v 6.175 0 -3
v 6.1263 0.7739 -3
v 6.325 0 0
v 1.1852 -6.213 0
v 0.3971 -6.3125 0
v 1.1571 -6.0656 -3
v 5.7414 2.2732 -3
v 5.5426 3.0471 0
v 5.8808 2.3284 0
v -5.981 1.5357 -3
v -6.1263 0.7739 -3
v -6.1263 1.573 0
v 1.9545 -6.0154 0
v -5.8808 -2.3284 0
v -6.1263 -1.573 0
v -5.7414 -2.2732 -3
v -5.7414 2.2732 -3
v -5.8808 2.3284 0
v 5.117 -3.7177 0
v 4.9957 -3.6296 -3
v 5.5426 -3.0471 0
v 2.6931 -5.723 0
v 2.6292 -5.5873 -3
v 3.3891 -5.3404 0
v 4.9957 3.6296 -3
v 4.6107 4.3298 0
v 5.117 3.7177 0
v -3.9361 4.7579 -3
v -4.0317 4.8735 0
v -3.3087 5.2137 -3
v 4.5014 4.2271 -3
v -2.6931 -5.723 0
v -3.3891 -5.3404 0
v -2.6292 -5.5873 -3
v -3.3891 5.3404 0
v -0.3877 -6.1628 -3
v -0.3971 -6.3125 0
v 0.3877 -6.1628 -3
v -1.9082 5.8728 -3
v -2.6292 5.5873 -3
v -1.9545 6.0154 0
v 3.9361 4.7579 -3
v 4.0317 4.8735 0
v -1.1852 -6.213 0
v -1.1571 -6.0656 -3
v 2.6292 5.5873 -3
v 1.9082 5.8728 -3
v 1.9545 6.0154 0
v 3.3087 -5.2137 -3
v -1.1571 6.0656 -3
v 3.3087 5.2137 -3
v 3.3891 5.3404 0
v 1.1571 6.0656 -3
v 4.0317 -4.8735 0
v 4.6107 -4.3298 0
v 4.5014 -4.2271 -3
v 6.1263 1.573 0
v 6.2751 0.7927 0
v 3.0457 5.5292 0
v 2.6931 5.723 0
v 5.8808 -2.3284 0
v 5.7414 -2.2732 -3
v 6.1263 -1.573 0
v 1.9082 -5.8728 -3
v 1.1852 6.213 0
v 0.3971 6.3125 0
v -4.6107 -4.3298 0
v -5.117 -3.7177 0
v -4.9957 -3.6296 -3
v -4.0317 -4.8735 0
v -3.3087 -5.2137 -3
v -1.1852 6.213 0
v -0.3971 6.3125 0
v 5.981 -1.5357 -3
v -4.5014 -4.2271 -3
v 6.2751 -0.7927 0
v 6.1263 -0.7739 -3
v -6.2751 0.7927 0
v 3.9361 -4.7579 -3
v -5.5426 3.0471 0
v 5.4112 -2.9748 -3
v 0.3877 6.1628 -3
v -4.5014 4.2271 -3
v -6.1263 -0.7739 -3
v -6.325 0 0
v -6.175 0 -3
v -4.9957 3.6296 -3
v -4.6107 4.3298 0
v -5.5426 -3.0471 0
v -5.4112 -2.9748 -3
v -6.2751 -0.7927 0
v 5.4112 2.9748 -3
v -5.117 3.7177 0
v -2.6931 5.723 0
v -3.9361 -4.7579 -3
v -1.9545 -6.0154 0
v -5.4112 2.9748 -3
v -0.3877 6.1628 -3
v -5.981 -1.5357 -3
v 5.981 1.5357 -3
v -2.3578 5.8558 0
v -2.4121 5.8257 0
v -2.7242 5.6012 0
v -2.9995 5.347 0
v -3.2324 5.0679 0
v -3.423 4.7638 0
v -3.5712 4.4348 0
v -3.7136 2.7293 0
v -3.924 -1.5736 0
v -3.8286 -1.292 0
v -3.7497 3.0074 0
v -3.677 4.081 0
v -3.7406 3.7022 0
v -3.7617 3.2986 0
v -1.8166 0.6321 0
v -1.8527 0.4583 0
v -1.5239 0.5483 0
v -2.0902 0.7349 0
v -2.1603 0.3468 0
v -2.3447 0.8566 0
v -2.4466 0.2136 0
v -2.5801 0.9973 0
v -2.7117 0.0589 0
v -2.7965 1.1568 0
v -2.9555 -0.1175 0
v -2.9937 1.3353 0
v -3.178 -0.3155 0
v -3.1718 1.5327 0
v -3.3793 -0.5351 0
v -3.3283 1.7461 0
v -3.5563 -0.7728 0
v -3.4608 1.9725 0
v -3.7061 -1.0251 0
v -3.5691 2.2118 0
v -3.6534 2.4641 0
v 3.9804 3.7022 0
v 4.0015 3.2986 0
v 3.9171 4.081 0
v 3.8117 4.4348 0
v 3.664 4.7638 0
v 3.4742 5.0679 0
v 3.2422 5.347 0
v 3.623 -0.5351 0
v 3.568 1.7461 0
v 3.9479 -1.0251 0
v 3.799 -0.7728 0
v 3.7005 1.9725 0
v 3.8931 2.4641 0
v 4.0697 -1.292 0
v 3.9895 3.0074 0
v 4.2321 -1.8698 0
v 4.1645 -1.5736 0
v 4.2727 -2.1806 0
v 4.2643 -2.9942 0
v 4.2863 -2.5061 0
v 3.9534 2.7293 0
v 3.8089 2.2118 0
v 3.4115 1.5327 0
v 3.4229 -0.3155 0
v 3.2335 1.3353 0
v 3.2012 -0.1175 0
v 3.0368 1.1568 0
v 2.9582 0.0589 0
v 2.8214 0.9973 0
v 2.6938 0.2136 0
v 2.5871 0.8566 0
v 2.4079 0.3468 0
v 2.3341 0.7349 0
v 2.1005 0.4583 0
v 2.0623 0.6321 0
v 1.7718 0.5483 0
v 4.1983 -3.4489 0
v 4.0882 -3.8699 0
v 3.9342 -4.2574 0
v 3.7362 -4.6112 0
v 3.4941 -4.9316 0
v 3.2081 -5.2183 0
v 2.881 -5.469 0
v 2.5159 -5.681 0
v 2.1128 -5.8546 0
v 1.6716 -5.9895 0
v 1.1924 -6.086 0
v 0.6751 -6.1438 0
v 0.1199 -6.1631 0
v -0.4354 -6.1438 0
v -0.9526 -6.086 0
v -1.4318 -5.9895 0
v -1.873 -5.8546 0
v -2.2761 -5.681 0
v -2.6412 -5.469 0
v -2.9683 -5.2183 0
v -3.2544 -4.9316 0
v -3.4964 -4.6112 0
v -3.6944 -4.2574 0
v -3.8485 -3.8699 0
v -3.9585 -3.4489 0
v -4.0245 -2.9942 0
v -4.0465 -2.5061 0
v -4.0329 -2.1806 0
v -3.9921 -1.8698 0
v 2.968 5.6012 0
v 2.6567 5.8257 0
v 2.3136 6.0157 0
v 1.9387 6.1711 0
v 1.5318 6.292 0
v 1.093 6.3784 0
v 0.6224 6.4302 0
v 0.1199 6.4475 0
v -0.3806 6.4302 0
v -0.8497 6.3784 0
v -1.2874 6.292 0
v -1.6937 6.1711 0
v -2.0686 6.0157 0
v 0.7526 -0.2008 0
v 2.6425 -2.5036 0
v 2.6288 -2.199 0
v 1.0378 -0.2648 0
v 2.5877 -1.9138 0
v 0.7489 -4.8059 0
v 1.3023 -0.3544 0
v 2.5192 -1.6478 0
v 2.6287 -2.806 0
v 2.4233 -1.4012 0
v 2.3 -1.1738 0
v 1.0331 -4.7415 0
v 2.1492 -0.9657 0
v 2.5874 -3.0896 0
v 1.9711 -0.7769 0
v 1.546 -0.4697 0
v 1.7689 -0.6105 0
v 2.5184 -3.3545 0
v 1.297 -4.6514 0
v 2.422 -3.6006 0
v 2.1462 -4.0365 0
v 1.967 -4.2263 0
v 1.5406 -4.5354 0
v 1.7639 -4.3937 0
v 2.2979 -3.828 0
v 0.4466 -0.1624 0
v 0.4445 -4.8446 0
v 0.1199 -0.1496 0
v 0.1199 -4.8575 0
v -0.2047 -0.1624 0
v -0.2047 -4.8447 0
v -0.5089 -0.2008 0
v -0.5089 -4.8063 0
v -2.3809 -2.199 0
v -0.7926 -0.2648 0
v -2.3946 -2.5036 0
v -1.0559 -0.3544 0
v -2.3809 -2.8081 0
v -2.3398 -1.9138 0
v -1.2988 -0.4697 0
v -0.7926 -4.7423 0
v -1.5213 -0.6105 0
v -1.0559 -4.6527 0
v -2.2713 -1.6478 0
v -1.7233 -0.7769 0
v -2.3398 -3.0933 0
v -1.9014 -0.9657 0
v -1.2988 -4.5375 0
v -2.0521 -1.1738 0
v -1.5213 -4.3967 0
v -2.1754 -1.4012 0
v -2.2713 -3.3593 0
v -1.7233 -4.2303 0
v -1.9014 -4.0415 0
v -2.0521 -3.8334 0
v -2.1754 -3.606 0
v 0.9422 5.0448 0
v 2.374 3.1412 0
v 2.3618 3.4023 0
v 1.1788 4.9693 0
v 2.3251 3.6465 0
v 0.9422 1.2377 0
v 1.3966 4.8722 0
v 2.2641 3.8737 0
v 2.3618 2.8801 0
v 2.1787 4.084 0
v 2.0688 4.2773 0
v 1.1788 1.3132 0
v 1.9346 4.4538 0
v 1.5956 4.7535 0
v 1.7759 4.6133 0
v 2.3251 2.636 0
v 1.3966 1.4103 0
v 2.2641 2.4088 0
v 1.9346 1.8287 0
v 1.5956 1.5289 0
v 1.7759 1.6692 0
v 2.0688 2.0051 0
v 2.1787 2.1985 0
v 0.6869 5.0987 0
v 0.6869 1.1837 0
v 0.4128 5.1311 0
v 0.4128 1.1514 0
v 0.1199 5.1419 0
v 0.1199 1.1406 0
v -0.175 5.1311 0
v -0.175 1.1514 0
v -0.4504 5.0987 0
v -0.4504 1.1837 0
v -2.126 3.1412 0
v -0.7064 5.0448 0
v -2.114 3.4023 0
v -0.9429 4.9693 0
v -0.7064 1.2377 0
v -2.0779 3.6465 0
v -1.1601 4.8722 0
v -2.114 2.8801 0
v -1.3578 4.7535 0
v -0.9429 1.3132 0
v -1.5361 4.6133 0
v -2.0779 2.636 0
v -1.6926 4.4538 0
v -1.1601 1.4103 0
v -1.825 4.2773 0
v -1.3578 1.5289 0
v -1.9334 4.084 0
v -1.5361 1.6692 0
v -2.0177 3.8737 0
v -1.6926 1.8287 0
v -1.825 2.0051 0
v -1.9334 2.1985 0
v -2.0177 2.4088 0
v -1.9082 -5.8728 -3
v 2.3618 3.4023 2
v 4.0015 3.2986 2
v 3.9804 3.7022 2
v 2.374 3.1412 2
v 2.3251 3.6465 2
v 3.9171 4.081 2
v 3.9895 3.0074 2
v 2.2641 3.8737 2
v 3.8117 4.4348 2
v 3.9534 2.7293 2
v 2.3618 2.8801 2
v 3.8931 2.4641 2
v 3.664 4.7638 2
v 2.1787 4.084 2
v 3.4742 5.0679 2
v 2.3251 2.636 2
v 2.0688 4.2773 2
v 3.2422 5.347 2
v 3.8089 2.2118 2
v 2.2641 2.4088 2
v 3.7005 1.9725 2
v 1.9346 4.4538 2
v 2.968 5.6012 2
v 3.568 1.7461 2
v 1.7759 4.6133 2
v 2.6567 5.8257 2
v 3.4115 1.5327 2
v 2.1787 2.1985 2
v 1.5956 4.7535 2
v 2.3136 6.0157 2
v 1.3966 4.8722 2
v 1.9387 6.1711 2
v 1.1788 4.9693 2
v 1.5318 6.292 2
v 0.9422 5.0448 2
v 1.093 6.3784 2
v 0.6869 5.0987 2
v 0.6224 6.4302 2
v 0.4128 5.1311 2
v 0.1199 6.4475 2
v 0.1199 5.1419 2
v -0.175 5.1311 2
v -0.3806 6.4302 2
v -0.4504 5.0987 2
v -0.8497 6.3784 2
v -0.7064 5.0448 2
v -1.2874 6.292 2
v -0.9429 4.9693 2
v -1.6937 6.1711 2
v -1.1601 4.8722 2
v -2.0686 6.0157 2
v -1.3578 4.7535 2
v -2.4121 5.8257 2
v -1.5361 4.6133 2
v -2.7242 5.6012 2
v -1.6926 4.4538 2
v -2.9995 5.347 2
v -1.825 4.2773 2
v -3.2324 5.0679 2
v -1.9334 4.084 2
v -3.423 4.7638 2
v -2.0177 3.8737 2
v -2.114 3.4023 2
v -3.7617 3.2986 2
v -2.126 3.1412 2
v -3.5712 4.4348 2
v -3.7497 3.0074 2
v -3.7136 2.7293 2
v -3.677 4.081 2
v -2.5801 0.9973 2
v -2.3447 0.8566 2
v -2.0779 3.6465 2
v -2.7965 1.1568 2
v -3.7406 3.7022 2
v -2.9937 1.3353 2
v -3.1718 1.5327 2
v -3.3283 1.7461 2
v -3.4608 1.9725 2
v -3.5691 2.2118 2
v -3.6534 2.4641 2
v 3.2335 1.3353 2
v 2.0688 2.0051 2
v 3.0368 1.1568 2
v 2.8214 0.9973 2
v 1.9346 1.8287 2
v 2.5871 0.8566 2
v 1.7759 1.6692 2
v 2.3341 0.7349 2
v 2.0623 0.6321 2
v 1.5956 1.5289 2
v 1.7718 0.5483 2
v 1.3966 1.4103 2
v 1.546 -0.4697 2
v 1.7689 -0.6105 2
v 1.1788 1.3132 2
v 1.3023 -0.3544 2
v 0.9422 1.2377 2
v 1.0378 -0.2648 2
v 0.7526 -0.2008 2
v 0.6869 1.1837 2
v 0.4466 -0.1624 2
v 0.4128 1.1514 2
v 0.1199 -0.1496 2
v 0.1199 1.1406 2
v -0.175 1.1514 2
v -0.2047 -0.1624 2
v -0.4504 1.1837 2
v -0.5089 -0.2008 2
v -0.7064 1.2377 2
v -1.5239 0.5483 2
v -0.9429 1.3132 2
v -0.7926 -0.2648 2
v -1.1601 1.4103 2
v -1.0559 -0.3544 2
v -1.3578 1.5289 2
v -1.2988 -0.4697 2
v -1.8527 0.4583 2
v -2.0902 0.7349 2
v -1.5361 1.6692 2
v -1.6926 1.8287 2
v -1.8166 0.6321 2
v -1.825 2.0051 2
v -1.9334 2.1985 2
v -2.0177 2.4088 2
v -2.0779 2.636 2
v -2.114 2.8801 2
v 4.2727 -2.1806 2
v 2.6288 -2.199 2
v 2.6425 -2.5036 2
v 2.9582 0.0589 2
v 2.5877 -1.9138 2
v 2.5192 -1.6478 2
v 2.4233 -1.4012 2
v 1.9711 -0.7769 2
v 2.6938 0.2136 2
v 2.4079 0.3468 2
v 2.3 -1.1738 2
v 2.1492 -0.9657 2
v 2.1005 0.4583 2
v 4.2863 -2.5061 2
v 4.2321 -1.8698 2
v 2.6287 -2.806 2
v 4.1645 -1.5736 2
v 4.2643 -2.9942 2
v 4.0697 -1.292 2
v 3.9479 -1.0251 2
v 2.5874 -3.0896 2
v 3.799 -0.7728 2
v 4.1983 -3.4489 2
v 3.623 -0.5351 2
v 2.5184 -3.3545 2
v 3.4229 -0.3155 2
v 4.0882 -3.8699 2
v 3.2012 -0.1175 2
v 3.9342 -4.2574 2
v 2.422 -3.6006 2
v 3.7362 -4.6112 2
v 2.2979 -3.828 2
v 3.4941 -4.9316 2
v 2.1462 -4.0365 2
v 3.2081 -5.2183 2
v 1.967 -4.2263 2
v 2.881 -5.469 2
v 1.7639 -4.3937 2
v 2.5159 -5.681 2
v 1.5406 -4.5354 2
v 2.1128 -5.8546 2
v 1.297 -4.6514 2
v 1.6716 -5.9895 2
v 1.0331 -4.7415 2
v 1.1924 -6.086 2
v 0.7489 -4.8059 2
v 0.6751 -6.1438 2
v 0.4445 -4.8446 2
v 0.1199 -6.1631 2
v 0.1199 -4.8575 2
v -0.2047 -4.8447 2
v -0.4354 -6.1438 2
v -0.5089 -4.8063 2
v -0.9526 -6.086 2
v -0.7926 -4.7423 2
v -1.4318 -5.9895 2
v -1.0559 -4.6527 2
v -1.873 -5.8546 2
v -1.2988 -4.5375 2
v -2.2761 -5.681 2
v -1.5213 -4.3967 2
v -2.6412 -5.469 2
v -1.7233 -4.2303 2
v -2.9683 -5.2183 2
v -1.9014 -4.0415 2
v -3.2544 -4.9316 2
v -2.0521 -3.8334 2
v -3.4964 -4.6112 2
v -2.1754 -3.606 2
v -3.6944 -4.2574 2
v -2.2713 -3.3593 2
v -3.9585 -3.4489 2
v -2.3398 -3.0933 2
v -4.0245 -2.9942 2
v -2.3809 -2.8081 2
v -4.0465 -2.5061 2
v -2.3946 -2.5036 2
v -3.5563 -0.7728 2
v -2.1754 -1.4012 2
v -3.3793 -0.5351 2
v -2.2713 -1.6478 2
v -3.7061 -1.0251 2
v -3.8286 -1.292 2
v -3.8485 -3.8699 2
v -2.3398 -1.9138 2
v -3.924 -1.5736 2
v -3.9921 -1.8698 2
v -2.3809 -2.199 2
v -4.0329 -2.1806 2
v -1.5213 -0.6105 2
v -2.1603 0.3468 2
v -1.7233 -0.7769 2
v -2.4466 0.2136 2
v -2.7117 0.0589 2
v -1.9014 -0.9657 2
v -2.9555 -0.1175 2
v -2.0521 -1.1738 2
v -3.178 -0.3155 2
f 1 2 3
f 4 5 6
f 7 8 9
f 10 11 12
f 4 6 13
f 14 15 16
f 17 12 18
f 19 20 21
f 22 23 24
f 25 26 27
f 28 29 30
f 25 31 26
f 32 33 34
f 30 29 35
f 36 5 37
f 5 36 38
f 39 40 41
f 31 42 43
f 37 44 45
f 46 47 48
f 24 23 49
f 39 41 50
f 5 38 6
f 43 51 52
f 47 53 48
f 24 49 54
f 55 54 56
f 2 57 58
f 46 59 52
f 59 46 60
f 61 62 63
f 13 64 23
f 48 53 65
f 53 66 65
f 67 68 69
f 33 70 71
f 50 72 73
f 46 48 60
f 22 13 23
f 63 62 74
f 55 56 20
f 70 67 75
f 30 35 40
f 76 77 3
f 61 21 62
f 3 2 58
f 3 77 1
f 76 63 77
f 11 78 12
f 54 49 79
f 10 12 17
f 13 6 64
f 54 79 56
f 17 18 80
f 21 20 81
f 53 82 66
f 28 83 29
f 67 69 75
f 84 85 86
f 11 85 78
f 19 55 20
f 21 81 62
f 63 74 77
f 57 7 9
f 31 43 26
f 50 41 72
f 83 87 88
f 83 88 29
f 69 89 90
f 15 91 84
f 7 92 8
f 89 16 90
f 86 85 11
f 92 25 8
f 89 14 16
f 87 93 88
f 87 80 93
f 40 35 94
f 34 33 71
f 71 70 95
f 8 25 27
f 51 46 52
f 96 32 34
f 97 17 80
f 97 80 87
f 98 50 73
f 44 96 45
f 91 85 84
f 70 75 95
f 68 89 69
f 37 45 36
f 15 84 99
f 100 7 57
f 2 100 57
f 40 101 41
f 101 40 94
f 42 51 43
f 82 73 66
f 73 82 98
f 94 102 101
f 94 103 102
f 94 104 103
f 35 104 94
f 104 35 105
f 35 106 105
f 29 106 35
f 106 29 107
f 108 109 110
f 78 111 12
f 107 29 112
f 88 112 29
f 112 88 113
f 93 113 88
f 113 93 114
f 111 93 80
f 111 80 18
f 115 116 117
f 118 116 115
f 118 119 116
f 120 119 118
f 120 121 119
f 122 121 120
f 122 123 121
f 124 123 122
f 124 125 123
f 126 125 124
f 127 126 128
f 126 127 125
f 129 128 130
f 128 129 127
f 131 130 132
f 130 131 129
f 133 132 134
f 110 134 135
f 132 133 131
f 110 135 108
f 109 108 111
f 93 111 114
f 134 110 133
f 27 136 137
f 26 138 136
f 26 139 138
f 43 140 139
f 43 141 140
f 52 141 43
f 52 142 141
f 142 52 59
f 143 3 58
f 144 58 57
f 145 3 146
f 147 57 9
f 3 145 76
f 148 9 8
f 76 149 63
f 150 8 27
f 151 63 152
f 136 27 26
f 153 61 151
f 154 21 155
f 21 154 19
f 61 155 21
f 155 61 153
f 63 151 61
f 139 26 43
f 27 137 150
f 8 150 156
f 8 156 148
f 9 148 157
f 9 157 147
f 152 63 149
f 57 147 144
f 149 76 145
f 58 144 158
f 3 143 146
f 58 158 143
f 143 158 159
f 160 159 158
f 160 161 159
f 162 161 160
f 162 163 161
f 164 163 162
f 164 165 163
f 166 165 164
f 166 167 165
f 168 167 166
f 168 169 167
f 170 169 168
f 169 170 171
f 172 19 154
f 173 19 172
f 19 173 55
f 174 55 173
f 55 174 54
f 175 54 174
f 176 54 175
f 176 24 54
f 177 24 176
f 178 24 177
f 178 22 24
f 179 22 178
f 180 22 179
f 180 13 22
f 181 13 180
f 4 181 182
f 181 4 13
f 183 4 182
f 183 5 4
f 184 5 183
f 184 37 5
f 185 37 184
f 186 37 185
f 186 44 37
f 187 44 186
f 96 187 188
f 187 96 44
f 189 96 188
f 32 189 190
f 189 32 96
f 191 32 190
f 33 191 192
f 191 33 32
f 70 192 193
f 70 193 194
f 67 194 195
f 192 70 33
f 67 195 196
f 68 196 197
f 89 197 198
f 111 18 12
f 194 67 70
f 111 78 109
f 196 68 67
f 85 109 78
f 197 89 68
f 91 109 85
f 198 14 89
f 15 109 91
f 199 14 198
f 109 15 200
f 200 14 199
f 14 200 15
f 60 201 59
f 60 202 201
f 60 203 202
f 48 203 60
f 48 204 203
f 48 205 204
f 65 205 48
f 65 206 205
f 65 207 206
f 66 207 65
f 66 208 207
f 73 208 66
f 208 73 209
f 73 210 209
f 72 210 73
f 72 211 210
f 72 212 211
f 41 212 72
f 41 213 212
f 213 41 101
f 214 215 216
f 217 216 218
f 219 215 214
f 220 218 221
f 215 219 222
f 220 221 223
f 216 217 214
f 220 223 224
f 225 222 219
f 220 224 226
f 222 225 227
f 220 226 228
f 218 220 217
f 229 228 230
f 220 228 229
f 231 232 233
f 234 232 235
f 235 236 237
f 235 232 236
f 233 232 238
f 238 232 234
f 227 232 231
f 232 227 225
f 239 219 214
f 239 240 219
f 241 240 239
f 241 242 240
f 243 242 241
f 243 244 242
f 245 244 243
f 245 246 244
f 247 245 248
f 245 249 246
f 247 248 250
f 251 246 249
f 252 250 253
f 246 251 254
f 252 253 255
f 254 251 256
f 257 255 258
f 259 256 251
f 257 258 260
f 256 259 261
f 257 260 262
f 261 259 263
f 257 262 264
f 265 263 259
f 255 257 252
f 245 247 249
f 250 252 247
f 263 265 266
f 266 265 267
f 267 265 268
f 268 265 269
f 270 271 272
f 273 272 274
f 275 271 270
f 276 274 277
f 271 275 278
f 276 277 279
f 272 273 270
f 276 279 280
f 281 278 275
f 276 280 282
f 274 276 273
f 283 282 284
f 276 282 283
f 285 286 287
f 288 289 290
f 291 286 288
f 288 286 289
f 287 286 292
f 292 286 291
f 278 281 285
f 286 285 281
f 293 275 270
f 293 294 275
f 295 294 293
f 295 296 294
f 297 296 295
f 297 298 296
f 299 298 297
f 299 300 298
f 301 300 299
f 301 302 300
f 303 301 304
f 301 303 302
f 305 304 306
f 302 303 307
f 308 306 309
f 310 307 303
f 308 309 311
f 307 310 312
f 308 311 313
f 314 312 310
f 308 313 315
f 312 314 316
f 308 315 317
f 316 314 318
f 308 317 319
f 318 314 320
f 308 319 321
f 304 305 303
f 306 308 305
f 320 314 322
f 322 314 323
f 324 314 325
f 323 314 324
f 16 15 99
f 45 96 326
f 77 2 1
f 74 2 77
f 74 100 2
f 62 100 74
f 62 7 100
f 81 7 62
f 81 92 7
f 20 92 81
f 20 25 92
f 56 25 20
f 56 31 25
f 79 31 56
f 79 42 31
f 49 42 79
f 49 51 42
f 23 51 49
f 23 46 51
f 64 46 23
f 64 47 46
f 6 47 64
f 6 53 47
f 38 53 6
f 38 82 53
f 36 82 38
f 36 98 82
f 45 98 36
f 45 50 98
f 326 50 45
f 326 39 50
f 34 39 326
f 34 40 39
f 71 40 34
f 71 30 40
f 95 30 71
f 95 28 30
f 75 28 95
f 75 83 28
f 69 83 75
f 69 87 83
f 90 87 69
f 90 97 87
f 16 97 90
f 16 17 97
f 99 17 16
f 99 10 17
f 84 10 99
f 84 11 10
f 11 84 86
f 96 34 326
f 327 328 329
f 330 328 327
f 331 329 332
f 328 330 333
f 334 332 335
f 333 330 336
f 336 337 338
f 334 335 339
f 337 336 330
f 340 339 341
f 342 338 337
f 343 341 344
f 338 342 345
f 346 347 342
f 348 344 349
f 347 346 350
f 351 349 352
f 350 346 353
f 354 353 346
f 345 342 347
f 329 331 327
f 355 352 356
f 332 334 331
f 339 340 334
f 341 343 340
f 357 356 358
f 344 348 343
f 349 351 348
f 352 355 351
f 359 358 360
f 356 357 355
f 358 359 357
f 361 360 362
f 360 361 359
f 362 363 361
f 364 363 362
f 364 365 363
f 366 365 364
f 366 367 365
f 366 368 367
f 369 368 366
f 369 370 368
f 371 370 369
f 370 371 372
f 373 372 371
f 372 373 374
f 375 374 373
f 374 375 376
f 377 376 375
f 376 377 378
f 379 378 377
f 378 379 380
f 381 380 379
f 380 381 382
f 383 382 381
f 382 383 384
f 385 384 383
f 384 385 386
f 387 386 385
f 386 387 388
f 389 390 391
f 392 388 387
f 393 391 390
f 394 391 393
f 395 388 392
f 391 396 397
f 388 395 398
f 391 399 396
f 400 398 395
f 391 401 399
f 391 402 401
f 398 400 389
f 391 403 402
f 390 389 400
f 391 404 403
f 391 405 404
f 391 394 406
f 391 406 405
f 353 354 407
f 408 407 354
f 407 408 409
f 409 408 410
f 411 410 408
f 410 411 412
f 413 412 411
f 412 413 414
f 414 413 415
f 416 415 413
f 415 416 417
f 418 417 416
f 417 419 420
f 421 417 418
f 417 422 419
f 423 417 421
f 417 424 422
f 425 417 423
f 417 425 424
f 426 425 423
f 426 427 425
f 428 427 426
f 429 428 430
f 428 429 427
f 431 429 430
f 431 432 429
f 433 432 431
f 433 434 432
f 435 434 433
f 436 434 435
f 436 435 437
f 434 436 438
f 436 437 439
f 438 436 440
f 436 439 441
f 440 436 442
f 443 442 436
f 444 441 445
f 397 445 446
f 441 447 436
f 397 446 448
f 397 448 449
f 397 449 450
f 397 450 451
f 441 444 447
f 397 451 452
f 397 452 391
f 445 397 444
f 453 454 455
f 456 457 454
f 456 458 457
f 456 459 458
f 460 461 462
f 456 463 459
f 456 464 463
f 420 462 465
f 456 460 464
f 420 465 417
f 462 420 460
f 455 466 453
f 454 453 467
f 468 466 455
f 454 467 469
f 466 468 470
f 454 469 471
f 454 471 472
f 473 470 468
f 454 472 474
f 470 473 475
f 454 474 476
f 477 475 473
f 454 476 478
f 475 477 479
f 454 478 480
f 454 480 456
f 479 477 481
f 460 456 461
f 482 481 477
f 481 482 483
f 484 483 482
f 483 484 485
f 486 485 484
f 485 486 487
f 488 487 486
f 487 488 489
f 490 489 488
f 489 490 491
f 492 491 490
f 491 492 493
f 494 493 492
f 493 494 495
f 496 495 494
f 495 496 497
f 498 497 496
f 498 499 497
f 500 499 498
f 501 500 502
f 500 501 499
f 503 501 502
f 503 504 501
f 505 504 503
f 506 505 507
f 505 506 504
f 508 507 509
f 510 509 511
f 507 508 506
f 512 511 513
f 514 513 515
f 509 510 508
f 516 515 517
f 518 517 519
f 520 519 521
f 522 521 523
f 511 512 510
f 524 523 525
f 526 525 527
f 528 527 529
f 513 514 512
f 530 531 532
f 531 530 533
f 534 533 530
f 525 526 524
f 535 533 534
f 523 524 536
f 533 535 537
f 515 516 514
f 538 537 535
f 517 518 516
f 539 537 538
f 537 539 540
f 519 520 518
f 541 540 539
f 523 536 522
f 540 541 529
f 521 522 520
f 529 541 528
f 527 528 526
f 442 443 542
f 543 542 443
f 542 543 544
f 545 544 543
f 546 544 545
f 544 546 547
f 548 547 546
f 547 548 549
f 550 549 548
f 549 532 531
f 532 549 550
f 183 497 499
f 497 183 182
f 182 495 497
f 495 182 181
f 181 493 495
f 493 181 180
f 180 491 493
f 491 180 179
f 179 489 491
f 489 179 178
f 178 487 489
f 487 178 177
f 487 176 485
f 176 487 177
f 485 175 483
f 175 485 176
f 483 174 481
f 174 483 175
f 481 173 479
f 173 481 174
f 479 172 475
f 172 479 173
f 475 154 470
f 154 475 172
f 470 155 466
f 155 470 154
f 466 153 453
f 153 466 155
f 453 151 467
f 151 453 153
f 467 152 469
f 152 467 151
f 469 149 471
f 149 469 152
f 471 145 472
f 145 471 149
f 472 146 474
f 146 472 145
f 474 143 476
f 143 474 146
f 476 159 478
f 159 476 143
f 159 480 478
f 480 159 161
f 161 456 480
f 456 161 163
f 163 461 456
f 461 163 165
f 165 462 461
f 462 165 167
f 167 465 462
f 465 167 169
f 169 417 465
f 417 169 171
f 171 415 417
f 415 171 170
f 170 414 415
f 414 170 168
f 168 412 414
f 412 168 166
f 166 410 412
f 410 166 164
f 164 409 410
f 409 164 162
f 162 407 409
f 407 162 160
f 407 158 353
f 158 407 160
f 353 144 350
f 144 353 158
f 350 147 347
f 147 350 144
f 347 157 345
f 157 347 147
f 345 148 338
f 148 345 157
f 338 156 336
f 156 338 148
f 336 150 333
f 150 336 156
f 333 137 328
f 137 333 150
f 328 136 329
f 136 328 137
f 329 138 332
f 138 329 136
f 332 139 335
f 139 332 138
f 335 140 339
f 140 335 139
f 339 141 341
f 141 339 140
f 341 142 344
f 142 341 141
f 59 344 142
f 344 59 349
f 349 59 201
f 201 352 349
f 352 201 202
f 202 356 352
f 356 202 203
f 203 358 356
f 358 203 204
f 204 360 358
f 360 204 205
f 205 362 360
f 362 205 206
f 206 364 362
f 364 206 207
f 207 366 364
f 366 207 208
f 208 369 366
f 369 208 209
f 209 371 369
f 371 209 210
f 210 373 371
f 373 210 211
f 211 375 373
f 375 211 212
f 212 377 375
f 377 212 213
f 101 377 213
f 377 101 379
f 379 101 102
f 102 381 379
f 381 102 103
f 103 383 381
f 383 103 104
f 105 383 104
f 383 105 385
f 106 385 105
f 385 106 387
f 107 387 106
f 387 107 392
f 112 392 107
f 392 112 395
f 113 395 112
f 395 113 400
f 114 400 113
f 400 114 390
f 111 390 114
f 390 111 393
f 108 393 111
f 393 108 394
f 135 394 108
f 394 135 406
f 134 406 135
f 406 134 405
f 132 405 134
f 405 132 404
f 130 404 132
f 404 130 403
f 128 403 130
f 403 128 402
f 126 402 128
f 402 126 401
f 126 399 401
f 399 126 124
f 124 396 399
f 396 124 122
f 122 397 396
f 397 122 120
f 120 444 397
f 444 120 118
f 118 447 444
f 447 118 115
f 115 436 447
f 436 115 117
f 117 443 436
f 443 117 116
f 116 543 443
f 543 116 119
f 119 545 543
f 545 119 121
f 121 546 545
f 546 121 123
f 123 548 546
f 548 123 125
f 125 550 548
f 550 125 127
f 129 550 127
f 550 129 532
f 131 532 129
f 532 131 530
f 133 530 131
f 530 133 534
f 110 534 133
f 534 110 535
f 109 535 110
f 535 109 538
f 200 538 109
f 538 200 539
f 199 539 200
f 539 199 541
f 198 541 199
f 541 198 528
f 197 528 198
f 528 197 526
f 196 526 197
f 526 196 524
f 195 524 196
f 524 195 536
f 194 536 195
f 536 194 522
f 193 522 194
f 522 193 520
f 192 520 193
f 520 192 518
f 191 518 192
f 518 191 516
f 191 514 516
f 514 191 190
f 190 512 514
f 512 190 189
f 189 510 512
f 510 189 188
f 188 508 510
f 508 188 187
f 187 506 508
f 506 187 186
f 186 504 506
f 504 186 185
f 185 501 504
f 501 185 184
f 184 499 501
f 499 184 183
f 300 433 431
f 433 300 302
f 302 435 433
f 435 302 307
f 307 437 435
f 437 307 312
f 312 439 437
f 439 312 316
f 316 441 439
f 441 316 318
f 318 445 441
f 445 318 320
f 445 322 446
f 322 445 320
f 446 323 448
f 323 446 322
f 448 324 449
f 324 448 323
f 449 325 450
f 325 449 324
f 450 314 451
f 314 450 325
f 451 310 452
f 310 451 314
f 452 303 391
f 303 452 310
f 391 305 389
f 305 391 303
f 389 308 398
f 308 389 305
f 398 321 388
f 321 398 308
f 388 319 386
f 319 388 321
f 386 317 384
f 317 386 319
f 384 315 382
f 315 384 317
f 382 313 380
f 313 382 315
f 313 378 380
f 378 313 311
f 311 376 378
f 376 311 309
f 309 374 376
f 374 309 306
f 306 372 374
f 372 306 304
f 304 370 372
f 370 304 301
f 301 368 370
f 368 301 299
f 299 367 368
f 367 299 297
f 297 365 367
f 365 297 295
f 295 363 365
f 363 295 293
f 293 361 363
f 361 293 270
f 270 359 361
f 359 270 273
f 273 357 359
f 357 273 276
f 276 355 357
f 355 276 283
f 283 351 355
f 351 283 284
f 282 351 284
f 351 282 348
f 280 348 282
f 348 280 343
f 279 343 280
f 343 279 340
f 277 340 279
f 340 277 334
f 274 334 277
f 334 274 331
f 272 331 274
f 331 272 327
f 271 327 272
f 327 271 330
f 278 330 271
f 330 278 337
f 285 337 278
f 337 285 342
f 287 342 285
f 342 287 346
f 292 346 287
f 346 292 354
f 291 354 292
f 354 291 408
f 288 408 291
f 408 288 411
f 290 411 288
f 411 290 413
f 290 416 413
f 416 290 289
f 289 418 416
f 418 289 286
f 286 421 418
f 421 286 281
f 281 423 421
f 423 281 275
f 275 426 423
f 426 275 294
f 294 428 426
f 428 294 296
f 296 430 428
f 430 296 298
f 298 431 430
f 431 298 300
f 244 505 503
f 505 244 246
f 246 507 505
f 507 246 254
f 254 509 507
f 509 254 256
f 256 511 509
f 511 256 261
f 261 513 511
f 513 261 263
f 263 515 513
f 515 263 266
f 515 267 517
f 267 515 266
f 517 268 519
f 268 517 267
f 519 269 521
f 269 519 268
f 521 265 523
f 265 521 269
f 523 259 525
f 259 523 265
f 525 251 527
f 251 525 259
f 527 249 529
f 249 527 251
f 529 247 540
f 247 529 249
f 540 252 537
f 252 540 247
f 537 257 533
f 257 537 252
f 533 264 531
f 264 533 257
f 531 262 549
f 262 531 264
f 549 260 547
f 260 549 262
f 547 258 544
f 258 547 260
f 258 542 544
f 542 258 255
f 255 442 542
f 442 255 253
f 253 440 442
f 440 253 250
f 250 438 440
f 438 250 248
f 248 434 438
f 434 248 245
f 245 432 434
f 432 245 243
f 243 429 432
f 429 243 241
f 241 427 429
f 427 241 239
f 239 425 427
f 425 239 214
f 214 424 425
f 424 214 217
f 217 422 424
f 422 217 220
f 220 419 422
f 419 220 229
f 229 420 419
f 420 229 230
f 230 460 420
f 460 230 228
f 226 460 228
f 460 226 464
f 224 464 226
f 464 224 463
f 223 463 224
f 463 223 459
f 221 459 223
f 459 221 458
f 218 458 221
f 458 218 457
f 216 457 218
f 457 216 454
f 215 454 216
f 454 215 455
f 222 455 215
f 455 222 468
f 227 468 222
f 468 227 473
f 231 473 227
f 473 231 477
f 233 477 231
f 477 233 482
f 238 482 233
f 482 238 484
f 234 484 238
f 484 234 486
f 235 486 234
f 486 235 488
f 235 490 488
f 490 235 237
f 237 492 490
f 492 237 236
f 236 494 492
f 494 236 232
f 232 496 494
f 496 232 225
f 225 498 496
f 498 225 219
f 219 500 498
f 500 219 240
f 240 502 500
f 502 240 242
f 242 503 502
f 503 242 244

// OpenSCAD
$fn = 50;

difference() {
	union() {
		translate(v = [0, 0, -3.0]) {
			cylinder(h = 3, r1 = 6.175, r2 = 6.325);
		}
		linear_extrude(height = 2) {
			text(font = "Impact", halign = "center", size = 12, text = "8", valign = "center");
		}
	}
	union();
}
